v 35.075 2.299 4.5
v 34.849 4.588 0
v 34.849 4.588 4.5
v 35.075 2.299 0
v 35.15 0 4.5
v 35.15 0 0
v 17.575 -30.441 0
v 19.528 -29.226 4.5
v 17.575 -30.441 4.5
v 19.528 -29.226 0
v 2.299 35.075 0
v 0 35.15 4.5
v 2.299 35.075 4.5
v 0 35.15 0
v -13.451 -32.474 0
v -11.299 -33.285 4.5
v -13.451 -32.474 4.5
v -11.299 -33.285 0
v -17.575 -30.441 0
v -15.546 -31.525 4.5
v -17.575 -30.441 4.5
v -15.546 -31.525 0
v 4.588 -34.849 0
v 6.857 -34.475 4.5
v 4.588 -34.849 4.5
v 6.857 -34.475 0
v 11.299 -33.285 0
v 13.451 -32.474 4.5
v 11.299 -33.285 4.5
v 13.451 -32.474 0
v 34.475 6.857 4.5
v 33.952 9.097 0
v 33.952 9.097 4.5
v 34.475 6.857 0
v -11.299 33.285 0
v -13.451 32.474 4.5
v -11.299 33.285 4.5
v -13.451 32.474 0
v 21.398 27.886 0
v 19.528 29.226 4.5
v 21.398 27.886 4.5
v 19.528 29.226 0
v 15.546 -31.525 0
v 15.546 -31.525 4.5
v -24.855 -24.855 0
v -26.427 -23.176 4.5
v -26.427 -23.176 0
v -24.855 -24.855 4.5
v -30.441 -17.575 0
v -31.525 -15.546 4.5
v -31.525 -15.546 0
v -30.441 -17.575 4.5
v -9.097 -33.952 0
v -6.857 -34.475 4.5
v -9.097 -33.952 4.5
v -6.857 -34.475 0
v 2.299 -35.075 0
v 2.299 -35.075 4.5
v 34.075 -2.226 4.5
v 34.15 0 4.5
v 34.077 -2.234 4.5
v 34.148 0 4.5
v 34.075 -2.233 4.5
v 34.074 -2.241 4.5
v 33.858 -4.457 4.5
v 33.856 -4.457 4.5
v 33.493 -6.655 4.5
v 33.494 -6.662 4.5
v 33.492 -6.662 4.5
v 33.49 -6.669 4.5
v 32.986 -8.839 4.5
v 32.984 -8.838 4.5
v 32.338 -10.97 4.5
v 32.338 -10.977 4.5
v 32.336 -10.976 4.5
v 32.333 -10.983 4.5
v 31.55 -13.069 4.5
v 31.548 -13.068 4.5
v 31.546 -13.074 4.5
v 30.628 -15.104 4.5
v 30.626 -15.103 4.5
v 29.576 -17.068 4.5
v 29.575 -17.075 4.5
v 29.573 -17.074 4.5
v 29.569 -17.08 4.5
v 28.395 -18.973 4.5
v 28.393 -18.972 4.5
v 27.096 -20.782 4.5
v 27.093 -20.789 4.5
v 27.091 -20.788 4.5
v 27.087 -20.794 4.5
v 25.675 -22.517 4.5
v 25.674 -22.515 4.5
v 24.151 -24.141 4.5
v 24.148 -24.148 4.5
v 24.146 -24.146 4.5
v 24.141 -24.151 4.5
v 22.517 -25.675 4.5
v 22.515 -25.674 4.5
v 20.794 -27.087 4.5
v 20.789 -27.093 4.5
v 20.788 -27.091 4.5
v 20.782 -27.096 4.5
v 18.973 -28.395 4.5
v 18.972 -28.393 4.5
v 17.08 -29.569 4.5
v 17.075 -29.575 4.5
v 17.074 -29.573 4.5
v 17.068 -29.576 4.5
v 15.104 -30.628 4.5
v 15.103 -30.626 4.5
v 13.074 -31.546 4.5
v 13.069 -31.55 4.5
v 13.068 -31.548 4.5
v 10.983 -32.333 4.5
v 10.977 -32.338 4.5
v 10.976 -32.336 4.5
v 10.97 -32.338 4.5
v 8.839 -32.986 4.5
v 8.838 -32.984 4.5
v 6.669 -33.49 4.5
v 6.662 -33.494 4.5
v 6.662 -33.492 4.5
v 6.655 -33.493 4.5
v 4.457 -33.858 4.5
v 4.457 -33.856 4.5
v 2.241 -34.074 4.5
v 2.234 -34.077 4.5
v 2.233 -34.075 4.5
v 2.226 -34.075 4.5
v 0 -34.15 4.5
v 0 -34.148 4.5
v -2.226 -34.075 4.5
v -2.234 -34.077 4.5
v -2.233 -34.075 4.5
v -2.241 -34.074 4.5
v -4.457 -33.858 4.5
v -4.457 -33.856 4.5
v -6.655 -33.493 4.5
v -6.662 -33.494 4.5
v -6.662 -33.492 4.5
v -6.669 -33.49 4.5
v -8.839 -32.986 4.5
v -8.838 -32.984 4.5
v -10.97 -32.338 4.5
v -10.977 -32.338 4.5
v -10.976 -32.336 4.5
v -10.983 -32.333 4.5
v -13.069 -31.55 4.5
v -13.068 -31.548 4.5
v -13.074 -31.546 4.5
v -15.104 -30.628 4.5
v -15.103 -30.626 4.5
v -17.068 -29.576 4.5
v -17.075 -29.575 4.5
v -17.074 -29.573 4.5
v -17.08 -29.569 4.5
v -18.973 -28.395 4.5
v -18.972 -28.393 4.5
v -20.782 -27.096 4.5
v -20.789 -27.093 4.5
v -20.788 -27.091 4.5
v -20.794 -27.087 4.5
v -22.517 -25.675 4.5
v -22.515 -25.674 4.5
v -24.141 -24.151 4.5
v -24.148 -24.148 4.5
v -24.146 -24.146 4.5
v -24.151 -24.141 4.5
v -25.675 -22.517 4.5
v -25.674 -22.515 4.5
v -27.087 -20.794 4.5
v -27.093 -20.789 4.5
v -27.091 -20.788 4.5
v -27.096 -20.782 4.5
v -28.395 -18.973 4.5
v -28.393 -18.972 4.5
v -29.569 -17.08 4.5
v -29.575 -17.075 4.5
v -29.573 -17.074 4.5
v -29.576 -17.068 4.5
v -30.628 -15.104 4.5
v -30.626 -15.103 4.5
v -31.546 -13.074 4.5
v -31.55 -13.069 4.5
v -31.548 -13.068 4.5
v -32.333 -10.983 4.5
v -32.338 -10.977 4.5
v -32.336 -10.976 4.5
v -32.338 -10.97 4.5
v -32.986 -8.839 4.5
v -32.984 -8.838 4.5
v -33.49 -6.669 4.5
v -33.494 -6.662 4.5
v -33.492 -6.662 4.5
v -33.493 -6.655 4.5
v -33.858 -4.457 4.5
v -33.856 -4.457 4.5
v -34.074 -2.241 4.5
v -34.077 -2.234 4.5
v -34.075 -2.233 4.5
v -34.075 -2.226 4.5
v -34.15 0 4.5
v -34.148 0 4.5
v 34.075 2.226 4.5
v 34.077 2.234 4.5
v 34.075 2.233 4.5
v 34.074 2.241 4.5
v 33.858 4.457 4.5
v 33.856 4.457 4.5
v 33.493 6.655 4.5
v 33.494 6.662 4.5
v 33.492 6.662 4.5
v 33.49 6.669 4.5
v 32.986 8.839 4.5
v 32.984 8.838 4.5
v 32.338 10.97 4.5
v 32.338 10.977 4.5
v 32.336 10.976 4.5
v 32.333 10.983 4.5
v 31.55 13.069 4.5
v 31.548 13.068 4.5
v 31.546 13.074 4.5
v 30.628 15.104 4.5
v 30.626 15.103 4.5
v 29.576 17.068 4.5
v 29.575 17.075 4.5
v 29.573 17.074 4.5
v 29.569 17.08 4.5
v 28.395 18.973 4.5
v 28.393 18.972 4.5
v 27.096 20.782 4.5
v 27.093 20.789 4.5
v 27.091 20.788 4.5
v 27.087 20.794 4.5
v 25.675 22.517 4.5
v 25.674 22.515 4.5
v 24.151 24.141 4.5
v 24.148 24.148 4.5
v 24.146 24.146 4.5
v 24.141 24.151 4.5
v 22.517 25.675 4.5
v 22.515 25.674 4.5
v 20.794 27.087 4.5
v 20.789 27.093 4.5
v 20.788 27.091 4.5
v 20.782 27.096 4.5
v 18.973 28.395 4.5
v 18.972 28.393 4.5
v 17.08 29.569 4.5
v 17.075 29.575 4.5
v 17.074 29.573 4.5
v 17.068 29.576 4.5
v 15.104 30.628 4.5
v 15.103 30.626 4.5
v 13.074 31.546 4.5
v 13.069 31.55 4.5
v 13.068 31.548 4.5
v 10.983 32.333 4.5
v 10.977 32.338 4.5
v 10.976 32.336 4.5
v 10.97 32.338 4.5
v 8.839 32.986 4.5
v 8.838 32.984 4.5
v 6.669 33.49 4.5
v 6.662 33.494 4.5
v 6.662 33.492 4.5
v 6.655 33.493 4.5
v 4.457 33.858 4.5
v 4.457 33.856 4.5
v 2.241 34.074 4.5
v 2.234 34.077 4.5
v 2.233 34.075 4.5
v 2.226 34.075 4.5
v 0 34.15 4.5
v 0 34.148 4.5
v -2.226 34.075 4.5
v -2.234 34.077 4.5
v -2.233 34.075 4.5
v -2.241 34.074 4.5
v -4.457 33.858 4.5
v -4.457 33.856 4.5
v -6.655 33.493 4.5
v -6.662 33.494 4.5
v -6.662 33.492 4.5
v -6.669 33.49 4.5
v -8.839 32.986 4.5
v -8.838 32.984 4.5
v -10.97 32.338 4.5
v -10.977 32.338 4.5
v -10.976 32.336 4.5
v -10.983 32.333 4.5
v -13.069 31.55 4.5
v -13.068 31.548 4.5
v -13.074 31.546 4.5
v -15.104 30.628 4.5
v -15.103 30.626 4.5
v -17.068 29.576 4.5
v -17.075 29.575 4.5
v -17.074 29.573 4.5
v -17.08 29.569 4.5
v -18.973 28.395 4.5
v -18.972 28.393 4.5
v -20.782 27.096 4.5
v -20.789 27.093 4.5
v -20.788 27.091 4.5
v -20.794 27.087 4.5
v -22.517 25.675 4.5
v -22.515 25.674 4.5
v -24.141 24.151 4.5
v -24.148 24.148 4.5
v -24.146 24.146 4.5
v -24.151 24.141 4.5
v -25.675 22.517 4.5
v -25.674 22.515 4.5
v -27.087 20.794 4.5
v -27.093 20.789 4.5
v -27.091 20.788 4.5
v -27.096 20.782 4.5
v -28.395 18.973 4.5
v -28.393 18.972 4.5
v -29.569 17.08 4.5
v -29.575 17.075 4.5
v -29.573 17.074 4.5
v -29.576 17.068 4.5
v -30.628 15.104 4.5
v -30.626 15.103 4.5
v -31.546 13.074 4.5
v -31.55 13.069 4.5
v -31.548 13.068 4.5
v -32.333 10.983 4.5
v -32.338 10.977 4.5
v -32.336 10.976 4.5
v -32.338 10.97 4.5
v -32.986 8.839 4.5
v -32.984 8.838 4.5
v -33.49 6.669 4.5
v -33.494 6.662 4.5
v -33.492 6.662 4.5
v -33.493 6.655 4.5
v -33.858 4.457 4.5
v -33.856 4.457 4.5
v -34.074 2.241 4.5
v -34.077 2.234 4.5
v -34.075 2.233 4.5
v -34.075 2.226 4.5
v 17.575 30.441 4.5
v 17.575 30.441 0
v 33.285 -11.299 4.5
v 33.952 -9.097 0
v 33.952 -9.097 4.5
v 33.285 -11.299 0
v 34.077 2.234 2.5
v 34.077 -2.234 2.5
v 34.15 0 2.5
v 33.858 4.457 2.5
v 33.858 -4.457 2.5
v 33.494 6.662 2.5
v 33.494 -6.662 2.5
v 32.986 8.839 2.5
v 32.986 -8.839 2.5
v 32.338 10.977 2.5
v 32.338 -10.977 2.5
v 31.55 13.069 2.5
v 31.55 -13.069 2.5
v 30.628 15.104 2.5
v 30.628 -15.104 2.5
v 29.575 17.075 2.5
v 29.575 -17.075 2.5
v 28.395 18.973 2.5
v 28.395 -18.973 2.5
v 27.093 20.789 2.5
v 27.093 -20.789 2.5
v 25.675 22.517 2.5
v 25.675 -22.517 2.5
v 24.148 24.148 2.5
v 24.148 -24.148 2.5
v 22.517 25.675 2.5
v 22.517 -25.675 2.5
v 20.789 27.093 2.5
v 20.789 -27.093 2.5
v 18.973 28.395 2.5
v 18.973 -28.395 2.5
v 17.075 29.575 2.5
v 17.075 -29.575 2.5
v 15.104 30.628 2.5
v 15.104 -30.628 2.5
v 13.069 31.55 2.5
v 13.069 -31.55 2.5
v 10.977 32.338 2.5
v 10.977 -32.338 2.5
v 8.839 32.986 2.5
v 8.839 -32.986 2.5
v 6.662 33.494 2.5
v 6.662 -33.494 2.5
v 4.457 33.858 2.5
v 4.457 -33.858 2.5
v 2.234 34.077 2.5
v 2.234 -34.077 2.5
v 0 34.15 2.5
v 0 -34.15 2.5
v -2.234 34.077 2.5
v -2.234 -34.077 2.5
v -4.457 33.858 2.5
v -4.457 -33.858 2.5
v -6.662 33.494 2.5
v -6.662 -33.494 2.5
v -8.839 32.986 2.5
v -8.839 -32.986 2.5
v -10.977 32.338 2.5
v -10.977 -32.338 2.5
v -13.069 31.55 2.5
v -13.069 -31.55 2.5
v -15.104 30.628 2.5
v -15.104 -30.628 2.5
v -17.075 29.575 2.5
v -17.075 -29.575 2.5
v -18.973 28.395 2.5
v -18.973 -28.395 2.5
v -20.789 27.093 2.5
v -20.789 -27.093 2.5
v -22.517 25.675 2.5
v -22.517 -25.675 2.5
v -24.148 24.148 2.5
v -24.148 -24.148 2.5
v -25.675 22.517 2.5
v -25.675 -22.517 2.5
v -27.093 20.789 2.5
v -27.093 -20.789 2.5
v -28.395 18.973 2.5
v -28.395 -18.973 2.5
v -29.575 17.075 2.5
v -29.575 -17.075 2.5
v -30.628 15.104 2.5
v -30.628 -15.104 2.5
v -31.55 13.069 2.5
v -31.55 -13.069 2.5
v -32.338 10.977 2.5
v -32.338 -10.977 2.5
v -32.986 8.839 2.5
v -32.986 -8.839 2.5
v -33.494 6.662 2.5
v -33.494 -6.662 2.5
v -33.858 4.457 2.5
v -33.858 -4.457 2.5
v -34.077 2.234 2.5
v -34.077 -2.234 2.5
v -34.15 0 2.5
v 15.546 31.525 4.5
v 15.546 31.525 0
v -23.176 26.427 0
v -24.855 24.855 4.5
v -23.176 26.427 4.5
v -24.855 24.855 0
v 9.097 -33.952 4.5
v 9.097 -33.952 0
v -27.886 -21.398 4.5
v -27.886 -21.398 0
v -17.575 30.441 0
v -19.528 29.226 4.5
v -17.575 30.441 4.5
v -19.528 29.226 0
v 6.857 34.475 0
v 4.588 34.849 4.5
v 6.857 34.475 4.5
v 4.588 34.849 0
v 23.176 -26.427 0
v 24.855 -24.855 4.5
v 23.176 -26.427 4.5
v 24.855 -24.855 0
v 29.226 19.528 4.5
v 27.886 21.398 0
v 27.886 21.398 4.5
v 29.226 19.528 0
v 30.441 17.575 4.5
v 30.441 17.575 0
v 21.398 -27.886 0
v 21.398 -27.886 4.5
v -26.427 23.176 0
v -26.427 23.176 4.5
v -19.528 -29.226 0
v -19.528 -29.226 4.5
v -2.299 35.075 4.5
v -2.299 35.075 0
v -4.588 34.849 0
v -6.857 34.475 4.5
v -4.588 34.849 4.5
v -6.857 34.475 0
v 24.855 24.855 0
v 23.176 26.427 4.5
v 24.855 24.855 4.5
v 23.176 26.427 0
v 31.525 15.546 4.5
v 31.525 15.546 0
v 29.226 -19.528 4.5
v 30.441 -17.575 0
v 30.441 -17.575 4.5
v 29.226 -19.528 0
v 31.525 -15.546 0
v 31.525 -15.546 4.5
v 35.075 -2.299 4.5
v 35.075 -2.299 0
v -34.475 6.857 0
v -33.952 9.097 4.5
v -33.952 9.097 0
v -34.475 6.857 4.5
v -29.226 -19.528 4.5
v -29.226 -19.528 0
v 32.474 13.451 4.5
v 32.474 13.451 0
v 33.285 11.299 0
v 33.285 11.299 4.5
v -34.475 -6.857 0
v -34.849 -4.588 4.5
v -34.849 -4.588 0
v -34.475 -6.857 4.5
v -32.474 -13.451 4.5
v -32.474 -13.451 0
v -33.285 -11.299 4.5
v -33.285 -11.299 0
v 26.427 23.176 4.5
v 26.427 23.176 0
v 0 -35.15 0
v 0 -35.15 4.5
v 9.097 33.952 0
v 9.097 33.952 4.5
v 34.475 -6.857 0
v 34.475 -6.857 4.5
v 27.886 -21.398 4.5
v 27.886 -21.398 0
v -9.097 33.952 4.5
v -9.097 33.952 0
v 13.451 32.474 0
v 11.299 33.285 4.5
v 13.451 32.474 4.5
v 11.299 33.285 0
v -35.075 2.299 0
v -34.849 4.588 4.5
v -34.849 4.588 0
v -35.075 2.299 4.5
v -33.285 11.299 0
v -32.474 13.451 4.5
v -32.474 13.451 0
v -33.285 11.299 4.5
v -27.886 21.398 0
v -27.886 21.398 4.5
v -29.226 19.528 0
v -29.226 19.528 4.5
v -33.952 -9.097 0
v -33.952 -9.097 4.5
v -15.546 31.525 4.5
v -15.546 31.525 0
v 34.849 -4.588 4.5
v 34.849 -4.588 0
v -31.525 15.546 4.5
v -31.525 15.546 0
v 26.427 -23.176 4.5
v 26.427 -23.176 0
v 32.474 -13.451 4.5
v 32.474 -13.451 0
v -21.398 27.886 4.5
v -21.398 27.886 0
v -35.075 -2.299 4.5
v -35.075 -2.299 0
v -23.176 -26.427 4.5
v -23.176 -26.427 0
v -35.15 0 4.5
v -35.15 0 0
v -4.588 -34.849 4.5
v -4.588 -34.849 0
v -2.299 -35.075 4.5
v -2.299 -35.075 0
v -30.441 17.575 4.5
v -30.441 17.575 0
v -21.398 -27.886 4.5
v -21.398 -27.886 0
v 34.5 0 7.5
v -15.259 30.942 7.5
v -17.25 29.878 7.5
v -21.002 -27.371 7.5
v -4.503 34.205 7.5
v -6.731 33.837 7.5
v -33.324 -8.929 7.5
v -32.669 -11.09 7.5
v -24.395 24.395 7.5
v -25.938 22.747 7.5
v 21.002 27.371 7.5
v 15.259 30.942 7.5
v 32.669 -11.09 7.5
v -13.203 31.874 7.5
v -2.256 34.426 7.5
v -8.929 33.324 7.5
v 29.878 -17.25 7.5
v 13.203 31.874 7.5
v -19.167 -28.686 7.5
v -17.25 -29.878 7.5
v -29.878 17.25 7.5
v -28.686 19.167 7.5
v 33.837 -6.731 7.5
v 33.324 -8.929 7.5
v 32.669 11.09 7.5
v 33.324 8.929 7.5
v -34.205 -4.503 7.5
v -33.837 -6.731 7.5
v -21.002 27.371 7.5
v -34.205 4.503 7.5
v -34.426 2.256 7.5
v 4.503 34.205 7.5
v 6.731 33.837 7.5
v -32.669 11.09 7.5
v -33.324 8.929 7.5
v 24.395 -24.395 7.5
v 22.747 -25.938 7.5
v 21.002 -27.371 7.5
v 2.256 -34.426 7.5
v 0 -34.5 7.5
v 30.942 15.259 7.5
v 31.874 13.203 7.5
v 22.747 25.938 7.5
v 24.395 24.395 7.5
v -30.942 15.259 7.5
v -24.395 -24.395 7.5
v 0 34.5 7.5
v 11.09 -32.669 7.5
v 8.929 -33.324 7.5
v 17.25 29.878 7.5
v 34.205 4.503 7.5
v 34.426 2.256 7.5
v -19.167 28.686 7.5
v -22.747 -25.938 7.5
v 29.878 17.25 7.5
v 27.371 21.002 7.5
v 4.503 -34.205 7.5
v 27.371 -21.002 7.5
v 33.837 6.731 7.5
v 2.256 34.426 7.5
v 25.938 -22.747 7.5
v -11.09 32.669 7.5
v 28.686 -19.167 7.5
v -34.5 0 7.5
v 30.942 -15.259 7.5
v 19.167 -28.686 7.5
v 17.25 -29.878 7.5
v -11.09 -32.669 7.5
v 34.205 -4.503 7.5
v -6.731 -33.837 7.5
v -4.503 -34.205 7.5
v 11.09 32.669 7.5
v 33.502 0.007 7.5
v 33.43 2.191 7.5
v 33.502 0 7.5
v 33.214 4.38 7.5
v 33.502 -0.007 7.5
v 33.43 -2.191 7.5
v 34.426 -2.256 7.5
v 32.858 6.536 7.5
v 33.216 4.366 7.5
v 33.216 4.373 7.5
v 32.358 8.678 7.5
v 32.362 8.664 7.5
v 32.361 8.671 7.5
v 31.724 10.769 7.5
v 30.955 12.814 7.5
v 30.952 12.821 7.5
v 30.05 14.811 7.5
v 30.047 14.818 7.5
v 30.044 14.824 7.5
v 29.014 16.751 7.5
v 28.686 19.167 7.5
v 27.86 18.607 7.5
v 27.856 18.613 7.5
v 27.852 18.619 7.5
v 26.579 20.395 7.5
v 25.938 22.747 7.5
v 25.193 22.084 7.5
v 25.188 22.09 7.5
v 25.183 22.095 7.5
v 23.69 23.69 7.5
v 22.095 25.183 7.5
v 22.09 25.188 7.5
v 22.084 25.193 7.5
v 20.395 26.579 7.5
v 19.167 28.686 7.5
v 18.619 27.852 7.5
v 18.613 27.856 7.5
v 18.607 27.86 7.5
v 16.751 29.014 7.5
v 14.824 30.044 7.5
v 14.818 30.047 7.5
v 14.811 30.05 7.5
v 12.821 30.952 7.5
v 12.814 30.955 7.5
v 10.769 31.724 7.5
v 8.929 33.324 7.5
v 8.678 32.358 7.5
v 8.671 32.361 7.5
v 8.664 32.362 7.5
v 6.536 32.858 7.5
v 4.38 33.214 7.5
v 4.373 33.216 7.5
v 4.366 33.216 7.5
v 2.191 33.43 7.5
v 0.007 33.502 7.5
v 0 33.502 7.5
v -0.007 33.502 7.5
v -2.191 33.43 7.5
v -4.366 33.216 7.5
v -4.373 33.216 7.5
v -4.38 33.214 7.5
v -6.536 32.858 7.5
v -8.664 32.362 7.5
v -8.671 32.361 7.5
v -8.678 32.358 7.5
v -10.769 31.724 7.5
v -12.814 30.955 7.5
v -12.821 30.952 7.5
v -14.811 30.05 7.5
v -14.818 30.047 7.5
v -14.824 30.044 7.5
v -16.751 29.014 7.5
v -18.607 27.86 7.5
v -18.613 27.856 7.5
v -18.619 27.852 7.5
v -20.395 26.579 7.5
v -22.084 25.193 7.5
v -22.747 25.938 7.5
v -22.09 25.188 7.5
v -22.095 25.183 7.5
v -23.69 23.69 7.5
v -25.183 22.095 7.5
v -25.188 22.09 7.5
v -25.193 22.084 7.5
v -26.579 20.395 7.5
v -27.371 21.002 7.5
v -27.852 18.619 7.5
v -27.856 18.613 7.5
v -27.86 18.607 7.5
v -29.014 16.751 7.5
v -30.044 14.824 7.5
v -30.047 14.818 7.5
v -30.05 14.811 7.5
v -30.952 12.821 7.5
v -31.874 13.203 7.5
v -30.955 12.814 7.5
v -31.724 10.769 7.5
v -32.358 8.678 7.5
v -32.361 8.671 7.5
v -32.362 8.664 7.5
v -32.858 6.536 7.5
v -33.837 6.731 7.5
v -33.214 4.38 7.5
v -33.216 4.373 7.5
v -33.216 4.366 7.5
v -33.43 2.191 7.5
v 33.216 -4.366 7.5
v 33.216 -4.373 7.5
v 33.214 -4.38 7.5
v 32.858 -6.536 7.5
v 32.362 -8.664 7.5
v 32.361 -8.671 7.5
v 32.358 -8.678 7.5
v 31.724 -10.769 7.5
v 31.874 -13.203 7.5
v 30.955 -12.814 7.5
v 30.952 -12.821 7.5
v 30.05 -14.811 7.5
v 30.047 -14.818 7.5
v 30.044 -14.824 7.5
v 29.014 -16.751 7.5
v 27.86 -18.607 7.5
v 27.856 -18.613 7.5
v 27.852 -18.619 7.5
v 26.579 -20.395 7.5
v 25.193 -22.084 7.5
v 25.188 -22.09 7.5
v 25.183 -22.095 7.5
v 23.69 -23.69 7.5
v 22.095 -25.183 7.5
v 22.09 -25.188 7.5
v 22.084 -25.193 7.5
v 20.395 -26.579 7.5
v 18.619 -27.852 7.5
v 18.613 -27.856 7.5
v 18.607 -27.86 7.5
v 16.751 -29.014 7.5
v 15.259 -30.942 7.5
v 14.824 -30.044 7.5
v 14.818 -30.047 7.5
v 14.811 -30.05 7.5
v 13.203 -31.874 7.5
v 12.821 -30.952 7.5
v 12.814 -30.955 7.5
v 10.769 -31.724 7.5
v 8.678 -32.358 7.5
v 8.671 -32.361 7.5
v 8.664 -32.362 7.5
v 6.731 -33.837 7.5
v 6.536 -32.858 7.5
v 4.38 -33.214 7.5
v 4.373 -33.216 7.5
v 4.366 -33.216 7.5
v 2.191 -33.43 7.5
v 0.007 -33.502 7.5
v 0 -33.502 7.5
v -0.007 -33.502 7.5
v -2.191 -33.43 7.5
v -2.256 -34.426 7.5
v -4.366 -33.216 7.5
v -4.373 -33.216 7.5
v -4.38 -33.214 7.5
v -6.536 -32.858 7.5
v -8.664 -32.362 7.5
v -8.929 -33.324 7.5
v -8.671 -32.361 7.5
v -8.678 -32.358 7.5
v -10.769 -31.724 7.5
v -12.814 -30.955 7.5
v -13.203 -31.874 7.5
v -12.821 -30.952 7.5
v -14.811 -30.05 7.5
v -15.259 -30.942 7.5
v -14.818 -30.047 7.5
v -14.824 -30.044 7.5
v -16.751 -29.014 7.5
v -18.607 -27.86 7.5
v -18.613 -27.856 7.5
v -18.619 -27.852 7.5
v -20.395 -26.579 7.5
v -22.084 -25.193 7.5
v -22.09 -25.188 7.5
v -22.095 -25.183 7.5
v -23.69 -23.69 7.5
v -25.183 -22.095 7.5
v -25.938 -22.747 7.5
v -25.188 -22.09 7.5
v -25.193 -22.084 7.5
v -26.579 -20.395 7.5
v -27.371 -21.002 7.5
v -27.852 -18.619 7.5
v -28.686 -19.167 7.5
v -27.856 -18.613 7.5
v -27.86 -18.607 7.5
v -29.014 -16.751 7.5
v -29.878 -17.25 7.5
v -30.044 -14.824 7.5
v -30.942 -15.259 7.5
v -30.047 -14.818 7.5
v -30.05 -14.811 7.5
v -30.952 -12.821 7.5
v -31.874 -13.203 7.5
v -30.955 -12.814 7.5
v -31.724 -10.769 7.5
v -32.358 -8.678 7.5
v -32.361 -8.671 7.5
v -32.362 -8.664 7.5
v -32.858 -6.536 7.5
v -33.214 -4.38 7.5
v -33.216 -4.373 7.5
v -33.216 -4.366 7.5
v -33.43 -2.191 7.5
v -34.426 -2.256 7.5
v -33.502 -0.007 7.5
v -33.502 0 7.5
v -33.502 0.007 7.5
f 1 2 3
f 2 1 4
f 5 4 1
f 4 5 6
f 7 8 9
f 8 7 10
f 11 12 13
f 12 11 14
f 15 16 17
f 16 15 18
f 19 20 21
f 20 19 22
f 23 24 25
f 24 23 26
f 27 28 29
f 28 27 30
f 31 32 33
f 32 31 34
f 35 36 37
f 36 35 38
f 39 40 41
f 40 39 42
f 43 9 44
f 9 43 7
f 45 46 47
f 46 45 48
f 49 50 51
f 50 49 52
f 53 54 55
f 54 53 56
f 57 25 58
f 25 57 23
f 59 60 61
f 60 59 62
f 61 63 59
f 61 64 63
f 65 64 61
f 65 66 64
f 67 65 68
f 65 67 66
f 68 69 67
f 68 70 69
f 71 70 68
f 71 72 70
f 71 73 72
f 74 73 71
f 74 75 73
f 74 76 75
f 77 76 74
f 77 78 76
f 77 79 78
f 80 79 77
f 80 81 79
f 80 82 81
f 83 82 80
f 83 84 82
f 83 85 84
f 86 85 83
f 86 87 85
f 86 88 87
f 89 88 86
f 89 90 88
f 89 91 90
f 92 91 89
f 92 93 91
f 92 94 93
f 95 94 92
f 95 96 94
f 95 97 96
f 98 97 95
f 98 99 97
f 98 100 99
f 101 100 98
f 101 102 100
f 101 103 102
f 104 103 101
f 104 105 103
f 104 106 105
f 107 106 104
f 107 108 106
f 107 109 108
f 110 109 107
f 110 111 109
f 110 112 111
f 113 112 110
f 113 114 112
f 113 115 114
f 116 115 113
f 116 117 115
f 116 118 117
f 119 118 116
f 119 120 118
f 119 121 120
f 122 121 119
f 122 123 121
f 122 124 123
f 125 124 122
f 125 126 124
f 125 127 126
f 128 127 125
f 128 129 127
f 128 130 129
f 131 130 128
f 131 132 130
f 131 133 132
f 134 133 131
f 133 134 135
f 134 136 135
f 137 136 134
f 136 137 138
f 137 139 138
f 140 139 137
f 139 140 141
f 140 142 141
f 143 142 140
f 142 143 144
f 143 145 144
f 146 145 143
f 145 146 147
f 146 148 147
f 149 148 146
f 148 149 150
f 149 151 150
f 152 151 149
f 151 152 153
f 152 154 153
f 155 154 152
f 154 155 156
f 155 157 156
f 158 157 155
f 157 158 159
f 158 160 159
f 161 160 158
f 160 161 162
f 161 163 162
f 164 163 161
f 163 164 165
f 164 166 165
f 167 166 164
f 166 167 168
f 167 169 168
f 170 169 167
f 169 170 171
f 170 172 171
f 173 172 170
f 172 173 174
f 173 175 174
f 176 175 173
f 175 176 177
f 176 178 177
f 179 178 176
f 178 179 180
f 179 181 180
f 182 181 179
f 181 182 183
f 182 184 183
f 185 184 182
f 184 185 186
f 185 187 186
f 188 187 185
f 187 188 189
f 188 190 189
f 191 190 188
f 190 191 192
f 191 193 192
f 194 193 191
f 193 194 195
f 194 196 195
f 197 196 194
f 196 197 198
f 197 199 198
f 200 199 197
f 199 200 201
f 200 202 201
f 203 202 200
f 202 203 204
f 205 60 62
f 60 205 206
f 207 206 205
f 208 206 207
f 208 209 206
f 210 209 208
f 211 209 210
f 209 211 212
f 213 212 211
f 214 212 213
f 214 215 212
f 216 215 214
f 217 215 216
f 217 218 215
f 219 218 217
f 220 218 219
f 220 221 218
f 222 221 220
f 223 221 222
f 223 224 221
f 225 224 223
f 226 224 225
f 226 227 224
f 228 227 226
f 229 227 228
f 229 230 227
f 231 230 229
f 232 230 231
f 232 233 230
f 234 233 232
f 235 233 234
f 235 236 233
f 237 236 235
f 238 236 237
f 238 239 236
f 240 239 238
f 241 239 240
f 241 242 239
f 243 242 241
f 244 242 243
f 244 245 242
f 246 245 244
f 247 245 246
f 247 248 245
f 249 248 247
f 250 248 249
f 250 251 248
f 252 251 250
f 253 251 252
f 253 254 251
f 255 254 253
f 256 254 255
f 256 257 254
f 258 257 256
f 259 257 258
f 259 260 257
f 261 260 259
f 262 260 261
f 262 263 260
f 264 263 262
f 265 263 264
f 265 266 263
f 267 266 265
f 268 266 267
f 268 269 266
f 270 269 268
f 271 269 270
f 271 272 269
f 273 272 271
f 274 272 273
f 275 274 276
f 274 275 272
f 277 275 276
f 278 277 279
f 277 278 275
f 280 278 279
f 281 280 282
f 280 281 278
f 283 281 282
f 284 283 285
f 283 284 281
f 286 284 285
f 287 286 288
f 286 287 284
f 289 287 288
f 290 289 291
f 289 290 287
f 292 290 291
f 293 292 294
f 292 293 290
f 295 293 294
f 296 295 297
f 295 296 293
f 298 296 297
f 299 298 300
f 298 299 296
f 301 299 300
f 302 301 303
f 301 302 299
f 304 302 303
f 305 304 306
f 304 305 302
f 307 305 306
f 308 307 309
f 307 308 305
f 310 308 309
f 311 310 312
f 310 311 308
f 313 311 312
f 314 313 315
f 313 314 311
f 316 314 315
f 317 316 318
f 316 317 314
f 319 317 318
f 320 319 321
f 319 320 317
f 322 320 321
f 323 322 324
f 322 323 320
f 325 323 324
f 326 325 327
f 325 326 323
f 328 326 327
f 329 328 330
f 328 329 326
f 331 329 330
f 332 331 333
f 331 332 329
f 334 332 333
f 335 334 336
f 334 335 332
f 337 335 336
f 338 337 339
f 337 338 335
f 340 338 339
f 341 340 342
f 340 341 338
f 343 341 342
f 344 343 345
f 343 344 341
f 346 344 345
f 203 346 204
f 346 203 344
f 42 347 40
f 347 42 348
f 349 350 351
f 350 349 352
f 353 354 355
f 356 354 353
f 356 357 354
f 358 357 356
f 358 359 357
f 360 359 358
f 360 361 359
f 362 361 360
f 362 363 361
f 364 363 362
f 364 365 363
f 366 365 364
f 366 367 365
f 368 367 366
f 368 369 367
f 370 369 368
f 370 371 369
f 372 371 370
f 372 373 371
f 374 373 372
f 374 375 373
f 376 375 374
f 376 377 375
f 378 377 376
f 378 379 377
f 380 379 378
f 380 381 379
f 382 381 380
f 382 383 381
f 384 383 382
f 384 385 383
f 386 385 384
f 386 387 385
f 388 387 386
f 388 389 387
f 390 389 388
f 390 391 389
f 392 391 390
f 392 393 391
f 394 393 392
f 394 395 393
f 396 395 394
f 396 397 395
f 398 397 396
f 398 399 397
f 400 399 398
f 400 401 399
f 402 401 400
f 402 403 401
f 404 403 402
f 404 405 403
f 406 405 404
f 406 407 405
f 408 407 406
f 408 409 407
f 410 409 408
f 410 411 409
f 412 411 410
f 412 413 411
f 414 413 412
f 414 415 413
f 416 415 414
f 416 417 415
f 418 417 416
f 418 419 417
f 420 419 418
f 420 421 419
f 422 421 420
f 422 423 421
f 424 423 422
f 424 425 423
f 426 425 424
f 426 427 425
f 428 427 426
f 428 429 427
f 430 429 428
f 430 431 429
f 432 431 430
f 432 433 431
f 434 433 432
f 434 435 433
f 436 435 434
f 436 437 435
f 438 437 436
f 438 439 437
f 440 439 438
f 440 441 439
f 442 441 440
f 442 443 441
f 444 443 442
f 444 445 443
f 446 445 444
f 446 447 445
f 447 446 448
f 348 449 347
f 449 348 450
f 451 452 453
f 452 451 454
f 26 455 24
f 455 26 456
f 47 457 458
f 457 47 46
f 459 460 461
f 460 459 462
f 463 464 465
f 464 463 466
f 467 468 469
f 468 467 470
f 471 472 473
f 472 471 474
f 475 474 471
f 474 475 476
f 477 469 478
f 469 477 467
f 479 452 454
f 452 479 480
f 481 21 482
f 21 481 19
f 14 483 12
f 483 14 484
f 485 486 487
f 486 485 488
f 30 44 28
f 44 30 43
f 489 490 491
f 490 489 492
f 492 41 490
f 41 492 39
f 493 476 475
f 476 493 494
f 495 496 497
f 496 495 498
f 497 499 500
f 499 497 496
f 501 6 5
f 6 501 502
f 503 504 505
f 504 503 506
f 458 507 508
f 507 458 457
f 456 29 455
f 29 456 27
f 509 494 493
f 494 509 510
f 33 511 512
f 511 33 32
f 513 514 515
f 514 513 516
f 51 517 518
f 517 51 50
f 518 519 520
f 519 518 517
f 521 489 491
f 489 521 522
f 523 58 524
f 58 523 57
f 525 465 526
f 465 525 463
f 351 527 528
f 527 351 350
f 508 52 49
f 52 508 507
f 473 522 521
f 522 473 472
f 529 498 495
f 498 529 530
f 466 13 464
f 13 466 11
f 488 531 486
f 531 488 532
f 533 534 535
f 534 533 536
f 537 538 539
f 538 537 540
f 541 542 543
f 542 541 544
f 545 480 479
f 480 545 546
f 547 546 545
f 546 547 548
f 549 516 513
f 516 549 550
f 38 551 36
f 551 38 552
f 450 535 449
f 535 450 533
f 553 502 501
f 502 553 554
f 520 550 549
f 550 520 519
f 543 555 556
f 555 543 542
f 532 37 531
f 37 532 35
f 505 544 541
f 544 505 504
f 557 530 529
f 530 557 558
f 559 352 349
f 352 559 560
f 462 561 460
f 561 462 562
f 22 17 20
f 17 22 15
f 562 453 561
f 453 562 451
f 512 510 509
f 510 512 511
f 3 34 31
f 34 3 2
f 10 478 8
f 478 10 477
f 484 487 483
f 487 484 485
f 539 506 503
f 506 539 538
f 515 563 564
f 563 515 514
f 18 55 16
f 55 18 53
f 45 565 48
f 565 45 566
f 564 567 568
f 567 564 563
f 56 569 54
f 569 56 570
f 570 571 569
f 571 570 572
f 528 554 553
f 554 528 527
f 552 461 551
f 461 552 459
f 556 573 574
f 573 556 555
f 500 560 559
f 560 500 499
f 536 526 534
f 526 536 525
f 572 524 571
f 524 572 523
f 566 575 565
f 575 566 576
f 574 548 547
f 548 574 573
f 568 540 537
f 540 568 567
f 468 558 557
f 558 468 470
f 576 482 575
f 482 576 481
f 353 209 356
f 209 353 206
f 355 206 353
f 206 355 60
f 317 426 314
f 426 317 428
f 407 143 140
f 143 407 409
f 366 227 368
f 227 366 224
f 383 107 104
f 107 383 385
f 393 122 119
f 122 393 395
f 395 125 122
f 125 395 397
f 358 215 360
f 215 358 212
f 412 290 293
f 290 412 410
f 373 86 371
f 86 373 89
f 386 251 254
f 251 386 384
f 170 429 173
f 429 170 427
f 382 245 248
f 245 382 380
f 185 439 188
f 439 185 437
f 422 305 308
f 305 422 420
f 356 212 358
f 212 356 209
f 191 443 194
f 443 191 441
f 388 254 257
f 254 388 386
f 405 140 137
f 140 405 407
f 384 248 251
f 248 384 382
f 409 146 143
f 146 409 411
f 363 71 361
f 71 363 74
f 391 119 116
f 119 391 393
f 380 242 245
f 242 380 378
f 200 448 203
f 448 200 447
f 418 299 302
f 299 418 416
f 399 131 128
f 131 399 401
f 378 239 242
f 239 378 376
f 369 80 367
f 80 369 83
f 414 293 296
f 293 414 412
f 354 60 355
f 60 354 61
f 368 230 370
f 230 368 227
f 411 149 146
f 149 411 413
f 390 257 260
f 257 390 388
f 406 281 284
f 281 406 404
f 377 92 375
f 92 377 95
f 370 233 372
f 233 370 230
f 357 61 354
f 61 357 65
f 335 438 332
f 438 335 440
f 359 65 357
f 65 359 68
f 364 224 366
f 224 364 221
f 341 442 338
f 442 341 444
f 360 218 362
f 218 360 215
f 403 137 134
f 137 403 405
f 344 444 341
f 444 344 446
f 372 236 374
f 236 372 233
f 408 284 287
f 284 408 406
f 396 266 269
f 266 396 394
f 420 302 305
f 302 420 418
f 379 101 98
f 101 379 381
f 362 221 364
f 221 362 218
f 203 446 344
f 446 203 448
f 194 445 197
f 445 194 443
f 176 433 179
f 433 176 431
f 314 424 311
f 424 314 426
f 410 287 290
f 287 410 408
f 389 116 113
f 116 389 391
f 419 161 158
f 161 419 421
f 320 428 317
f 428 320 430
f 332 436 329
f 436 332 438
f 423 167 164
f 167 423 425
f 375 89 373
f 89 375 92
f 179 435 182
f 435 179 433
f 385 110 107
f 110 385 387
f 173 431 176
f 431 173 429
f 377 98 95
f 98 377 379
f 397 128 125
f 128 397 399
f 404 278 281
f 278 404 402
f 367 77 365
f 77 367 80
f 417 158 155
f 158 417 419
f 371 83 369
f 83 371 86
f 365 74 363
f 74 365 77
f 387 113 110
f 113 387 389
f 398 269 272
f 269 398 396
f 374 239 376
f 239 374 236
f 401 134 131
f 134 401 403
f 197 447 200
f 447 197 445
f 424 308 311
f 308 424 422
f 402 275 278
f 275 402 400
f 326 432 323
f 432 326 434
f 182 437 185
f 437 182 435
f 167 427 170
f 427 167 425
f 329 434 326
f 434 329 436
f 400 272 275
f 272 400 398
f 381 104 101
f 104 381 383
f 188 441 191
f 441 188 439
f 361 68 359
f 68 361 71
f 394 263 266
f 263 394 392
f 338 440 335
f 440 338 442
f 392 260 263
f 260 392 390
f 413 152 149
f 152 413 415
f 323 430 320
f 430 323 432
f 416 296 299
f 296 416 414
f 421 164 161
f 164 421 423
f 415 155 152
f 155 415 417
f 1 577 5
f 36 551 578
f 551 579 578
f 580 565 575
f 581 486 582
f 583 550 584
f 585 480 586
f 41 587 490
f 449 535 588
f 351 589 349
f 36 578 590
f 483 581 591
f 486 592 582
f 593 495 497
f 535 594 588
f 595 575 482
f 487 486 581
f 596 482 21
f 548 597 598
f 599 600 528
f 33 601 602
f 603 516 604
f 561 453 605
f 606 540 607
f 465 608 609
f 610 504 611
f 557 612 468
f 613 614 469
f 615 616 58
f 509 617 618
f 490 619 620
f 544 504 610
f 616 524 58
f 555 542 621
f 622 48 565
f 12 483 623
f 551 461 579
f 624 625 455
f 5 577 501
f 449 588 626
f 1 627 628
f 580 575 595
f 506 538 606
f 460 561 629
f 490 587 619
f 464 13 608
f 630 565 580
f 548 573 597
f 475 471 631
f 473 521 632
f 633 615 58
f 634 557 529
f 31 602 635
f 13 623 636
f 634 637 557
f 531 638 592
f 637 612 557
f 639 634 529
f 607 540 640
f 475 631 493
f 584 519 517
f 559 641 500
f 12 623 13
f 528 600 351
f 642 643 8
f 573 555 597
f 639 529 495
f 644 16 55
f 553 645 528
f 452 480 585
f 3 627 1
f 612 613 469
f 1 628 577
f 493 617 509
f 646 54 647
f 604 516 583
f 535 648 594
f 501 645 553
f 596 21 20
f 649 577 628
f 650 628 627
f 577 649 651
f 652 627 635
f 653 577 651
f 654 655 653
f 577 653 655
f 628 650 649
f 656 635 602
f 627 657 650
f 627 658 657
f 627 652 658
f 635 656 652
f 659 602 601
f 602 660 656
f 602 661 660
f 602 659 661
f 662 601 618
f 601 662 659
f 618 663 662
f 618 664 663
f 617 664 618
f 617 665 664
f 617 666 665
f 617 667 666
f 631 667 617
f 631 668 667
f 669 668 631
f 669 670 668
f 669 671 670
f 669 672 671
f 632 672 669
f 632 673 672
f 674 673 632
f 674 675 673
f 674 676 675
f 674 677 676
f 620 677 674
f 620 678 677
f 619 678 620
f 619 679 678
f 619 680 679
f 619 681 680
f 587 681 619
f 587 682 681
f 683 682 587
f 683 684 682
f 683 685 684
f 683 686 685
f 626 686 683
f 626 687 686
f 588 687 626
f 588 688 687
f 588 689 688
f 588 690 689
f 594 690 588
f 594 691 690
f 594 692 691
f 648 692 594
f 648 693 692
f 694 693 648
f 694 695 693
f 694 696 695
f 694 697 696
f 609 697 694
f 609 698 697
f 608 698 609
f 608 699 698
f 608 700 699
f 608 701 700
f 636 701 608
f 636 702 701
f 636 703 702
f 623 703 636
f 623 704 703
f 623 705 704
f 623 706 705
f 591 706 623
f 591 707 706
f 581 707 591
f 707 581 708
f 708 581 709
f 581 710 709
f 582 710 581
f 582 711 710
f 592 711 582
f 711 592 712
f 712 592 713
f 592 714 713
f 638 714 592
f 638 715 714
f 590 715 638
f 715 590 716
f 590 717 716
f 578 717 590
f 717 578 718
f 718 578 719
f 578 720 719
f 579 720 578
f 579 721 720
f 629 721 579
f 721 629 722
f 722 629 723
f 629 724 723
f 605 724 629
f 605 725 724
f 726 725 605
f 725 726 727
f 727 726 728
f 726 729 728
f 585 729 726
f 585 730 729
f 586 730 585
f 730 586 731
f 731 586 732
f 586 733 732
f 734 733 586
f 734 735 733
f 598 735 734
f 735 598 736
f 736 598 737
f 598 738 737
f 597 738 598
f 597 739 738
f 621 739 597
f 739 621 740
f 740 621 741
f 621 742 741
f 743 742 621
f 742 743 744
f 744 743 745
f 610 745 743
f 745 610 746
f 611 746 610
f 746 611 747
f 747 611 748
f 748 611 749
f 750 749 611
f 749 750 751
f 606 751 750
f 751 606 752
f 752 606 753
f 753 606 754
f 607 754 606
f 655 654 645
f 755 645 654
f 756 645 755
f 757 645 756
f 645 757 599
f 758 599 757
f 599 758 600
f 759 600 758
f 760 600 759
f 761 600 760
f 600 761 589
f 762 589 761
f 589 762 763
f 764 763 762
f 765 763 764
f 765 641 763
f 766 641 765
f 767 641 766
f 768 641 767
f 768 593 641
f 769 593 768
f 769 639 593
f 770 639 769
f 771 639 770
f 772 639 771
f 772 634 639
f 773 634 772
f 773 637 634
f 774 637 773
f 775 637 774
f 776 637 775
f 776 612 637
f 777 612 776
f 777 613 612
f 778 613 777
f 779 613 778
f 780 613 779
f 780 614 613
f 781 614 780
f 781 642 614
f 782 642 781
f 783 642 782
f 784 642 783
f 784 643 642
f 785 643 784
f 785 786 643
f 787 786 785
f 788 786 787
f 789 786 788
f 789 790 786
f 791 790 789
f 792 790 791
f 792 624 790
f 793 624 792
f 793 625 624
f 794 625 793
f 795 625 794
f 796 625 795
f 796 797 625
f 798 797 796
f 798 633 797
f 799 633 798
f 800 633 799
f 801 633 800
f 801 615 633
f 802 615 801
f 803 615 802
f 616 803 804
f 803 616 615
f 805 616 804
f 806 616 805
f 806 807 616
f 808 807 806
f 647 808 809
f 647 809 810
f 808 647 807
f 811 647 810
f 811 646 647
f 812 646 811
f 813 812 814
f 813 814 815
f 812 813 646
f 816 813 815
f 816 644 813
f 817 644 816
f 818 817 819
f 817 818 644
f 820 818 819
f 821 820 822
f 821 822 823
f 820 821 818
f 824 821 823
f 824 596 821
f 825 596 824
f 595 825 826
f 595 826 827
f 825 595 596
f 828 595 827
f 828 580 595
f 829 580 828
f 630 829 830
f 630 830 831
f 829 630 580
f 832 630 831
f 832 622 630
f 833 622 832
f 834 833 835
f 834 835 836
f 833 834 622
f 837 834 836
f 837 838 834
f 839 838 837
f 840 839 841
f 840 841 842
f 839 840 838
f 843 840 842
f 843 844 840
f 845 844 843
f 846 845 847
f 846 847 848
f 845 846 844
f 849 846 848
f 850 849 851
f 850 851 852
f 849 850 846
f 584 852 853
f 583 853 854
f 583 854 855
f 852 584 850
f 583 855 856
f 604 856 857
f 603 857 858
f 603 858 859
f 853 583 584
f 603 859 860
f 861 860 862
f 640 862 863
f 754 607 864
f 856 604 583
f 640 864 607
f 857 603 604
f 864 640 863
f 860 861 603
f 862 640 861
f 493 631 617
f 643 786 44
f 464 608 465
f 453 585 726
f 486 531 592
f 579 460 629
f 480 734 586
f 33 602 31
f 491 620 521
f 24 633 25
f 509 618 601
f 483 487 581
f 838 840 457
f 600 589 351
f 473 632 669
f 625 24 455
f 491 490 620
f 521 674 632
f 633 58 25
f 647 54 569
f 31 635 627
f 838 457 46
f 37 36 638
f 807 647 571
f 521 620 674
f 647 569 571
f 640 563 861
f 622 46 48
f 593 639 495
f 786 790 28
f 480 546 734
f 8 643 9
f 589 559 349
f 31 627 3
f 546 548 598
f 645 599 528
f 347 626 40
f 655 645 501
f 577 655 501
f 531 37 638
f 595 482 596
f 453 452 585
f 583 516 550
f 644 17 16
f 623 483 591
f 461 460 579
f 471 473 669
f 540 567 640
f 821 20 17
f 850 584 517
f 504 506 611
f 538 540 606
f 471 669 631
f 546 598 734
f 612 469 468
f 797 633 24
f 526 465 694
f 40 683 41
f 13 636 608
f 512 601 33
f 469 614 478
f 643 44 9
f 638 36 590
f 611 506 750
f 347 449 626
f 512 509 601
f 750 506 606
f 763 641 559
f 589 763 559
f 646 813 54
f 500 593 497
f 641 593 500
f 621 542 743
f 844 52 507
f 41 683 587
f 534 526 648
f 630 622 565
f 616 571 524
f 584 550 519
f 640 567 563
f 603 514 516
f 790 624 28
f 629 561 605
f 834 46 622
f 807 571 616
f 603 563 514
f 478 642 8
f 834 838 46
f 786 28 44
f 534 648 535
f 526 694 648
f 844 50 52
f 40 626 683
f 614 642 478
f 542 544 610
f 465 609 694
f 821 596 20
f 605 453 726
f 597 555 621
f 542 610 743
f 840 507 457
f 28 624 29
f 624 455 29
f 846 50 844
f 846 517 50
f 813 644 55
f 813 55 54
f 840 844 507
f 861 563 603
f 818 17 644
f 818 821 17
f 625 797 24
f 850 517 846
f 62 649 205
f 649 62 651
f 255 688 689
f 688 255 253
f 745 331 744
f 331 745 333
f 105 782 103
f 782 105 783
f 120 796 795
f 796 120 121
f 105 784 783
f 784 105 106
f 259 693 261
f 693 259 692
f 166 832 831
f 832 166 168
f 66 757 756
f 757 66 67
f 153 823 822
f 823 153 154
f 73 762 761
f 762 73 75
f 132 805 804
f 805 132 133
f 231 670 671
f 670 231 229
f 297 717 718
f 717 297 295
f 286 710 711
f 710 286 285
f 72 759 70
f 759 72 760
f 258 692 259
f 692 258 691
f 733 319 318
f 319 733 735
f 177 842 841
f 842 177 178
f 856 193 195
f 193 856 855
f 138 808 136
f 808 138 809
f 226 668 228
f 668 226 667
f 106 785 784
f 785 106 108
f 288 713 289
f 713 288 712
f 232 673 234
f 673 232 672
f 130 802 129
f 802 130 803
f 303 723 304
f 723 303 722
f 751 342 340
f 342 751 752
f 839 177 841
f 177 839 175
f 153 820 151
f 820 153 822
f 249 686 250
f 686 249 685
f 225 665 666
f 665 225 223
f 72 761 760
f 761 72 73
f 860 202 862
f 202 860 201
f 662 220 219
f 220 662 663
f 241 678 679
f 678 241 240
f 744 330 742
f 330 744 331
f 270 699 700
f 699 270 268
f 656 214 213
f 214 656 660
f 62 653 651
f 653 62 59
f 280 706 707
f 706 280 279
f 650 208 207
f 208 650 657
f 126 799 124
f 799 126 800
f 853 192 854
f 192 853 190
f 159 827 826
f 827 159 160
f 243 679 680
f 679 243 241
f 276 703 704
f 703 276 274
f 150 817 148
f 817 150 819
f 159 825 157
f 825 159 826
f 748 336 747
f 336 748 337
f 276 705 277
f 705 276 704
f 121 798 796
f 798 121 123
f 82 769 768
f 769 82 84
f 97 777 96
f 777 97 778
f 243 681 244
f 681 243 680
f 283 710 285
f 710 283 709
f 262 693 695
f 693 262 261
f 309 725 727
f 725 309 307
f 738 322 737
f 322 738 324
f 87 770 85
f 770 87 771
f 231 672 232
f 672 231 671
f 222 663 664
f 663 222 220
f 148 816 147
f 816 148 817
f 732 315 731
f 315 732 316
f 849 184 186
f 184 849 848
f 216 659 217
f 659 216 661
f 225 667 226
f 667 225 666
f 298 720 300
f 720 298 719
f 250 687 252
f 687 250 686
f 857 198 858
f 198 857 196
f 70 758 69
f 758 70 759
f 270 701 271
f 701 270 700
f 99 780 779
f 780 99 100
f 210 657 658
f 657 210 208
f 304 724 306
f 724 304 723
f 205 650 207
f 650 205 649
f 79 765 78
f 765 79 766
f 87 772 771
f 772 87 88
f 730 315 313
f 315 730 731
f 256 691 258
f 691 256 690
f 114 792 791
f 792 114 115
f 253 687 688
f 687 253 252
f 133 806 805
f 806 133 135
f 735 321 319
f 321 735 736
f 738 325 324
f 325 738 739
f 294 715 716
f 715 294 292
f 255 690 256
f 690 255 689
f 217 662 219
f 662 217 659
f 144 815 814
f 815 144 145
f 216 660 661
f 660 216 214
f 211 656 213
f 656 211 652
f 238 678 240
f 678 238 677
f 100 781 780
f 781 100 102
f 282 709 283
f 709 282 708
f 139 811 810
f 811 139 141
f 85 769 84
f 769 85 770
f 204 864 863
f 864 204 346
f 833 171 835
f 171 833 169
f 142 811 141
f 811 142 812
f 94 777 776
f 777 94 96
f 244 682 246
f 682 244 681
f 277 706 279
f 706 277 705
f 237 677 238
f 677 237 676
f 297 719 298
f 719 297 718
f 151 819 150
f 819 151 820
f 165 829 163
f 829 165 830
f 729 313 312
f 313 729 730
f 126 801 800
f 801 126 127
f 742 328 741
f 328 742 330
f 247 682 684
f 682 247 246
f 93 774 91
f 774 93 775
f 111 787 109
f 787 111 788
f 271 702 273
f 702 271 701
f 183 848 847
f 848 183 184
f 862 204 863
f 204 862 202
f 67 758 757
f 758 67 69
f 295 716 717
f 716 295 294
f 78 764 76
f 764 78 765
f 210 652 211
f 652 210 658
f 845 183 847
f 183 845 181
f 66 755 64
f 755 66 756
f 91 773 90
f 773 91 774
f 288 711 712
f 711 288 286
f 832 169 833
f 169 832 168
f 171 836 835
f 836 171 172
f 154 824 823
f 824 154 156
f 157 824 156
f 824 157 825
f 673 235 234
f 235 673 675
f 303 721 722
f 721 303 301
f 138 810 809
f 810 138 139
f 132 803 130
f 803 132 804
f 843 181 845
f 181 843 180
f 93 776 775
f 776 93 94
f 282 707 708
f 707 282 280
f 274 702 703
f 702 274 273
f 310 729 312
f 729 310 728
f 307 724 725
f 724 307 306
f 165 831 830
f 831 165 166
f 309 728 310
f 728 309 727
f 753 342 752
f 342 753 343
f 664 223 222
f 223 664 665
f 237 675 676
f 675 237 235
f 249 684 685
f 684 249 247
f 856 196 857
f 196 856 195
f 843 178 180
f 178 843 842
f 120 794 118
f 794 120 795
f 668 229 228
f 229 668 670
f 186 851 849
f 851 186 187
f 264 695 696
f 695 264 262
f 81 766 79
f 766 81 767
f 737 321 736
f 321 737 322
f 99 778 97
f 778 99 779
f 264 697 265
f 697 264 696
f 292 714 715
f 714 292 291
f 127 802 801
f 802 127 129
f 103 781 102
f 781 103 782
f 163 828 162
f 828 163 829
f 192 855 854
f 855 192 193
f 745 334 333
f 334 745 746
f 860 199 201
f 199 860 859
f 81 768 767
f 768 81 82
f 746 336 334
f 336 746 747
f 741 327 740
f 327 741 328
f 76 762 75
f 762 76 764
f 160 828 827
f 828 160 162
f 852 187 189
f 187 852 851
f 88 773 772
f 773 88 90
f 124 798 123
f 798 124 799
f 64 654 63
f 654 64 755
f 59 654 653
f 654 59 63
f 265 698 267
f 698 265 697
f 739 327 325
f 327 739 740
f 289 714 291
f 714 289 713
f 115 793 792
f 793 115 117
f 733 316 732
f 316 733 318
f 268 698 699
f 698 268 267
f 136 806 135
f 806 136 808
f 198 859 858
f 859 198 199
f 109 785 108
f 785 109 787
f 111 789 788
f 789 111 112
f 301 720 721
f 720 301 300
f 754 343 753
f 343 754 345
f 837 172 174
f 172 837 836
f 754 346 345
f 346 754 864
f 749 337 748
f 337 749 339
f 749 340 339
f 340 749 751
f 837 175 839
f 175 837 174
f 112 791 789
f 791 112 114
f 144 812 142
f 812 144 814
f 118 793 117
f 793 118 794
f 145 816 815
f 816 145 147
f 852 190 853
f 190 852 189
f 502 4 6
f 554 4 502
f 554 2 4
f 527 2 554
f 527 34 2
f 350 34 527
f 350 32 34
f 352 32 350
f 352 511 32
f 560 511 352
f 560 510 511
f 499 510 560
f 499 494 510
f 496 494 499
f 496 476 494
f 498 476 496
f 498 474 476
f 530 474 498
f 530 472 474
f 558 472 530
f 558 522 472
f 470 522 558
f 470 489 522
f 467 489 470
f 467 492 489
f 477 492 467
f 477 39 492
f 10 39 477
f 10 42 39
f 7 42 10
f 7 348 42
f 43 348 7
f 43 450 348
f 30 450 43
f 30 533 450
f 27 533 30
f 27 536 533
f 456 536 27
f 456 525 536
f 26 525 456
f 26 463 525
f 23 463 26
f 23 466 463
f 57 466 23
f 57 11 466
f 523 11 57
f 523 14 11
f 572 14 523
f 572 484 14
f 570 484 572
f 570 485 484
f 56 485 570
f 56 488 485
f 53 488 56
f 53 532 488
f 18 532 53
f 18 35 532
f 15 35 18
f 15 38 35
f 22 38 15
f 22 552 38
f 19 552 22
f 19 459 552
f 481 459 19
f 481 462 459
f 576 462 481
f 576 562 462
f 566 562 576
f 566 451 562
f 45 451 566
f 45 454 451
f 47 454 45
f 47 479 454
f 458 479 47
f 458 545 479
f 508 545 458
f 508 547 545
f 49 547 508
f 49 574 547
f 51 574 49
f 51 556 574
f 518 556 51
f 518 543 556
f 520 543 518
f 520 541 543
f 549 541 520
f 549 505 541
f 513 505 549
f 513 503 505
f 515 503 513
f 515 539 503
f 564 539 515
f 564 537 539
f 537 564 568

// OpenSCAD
// Friction-fit cap for a 75 mm rolled-rim dog food can.
// Designed for TPU. The skirt is straight where it overlaps the rim with light
// clearance, then tapers inward at the open tip to snap below the rolled rim
// and cling to the can body.
// Units: mm.

$fn = 96;

// ---------- Parameters ----------
can_od          = 68;    // outer diameter of the can's rolled rim
lip_height      = 5;     // total skirt length
tip_id          = 67;    // inner diameter at the open end (the pinch)

wall_thickness  = 1.0;   // skirt wall thickness
top_thickness   = 2.5;   // closed top thickness
clearance       = 0.3;   // diametral clearance over the rim (straight section)
taper_height    = 3;     // length of inward taper at the tip

// ---------- Derived ----------
skirt_id_closed = can_od + clearance;
skirt_id_open   = tip_id;
skirt_od_closed = skirt_id_closed + 2 * wall_thickness;
skirt_od_open   = skirt_id_open   + 2 * wall_thickness;
straight_h      = lip_height - taper_height;

// ---------- Geometry ----------
// Print orientation: closed top on the build plate, skirt opens upward.
// Gives a flat first layer and prints supports-free in TPU.
module can_cap() {
    // Closed top disk
    cylinder(d = skirt_od_closed, h = top_thickness);

    // Straight skirt section (slides over the rim with light clearance)
    translate([0, 0, top_thickness])
        difference() {
            cylinder(d = skirt_od_closed, h = straight_h);
            translate([0, 0, -0.01])
                cylinder(d = skirt_id_closed, h = straight_h + 0.02);
        }

    // Tapered tip — pinches inward to snap under the rolled rim
    translate([0, 0, top_thickness + straight_h])
        difference() {
            cylinder(d1 = skirt_od_closed, d2 = skirt_od_open, h = taper_height);
            translate([0, 0, -0.01])
                cylinder(d1 = skirt_id_closed, d2 = skirt_id_open, h = taper_height + 0.02);
        }
}

can_cap();
